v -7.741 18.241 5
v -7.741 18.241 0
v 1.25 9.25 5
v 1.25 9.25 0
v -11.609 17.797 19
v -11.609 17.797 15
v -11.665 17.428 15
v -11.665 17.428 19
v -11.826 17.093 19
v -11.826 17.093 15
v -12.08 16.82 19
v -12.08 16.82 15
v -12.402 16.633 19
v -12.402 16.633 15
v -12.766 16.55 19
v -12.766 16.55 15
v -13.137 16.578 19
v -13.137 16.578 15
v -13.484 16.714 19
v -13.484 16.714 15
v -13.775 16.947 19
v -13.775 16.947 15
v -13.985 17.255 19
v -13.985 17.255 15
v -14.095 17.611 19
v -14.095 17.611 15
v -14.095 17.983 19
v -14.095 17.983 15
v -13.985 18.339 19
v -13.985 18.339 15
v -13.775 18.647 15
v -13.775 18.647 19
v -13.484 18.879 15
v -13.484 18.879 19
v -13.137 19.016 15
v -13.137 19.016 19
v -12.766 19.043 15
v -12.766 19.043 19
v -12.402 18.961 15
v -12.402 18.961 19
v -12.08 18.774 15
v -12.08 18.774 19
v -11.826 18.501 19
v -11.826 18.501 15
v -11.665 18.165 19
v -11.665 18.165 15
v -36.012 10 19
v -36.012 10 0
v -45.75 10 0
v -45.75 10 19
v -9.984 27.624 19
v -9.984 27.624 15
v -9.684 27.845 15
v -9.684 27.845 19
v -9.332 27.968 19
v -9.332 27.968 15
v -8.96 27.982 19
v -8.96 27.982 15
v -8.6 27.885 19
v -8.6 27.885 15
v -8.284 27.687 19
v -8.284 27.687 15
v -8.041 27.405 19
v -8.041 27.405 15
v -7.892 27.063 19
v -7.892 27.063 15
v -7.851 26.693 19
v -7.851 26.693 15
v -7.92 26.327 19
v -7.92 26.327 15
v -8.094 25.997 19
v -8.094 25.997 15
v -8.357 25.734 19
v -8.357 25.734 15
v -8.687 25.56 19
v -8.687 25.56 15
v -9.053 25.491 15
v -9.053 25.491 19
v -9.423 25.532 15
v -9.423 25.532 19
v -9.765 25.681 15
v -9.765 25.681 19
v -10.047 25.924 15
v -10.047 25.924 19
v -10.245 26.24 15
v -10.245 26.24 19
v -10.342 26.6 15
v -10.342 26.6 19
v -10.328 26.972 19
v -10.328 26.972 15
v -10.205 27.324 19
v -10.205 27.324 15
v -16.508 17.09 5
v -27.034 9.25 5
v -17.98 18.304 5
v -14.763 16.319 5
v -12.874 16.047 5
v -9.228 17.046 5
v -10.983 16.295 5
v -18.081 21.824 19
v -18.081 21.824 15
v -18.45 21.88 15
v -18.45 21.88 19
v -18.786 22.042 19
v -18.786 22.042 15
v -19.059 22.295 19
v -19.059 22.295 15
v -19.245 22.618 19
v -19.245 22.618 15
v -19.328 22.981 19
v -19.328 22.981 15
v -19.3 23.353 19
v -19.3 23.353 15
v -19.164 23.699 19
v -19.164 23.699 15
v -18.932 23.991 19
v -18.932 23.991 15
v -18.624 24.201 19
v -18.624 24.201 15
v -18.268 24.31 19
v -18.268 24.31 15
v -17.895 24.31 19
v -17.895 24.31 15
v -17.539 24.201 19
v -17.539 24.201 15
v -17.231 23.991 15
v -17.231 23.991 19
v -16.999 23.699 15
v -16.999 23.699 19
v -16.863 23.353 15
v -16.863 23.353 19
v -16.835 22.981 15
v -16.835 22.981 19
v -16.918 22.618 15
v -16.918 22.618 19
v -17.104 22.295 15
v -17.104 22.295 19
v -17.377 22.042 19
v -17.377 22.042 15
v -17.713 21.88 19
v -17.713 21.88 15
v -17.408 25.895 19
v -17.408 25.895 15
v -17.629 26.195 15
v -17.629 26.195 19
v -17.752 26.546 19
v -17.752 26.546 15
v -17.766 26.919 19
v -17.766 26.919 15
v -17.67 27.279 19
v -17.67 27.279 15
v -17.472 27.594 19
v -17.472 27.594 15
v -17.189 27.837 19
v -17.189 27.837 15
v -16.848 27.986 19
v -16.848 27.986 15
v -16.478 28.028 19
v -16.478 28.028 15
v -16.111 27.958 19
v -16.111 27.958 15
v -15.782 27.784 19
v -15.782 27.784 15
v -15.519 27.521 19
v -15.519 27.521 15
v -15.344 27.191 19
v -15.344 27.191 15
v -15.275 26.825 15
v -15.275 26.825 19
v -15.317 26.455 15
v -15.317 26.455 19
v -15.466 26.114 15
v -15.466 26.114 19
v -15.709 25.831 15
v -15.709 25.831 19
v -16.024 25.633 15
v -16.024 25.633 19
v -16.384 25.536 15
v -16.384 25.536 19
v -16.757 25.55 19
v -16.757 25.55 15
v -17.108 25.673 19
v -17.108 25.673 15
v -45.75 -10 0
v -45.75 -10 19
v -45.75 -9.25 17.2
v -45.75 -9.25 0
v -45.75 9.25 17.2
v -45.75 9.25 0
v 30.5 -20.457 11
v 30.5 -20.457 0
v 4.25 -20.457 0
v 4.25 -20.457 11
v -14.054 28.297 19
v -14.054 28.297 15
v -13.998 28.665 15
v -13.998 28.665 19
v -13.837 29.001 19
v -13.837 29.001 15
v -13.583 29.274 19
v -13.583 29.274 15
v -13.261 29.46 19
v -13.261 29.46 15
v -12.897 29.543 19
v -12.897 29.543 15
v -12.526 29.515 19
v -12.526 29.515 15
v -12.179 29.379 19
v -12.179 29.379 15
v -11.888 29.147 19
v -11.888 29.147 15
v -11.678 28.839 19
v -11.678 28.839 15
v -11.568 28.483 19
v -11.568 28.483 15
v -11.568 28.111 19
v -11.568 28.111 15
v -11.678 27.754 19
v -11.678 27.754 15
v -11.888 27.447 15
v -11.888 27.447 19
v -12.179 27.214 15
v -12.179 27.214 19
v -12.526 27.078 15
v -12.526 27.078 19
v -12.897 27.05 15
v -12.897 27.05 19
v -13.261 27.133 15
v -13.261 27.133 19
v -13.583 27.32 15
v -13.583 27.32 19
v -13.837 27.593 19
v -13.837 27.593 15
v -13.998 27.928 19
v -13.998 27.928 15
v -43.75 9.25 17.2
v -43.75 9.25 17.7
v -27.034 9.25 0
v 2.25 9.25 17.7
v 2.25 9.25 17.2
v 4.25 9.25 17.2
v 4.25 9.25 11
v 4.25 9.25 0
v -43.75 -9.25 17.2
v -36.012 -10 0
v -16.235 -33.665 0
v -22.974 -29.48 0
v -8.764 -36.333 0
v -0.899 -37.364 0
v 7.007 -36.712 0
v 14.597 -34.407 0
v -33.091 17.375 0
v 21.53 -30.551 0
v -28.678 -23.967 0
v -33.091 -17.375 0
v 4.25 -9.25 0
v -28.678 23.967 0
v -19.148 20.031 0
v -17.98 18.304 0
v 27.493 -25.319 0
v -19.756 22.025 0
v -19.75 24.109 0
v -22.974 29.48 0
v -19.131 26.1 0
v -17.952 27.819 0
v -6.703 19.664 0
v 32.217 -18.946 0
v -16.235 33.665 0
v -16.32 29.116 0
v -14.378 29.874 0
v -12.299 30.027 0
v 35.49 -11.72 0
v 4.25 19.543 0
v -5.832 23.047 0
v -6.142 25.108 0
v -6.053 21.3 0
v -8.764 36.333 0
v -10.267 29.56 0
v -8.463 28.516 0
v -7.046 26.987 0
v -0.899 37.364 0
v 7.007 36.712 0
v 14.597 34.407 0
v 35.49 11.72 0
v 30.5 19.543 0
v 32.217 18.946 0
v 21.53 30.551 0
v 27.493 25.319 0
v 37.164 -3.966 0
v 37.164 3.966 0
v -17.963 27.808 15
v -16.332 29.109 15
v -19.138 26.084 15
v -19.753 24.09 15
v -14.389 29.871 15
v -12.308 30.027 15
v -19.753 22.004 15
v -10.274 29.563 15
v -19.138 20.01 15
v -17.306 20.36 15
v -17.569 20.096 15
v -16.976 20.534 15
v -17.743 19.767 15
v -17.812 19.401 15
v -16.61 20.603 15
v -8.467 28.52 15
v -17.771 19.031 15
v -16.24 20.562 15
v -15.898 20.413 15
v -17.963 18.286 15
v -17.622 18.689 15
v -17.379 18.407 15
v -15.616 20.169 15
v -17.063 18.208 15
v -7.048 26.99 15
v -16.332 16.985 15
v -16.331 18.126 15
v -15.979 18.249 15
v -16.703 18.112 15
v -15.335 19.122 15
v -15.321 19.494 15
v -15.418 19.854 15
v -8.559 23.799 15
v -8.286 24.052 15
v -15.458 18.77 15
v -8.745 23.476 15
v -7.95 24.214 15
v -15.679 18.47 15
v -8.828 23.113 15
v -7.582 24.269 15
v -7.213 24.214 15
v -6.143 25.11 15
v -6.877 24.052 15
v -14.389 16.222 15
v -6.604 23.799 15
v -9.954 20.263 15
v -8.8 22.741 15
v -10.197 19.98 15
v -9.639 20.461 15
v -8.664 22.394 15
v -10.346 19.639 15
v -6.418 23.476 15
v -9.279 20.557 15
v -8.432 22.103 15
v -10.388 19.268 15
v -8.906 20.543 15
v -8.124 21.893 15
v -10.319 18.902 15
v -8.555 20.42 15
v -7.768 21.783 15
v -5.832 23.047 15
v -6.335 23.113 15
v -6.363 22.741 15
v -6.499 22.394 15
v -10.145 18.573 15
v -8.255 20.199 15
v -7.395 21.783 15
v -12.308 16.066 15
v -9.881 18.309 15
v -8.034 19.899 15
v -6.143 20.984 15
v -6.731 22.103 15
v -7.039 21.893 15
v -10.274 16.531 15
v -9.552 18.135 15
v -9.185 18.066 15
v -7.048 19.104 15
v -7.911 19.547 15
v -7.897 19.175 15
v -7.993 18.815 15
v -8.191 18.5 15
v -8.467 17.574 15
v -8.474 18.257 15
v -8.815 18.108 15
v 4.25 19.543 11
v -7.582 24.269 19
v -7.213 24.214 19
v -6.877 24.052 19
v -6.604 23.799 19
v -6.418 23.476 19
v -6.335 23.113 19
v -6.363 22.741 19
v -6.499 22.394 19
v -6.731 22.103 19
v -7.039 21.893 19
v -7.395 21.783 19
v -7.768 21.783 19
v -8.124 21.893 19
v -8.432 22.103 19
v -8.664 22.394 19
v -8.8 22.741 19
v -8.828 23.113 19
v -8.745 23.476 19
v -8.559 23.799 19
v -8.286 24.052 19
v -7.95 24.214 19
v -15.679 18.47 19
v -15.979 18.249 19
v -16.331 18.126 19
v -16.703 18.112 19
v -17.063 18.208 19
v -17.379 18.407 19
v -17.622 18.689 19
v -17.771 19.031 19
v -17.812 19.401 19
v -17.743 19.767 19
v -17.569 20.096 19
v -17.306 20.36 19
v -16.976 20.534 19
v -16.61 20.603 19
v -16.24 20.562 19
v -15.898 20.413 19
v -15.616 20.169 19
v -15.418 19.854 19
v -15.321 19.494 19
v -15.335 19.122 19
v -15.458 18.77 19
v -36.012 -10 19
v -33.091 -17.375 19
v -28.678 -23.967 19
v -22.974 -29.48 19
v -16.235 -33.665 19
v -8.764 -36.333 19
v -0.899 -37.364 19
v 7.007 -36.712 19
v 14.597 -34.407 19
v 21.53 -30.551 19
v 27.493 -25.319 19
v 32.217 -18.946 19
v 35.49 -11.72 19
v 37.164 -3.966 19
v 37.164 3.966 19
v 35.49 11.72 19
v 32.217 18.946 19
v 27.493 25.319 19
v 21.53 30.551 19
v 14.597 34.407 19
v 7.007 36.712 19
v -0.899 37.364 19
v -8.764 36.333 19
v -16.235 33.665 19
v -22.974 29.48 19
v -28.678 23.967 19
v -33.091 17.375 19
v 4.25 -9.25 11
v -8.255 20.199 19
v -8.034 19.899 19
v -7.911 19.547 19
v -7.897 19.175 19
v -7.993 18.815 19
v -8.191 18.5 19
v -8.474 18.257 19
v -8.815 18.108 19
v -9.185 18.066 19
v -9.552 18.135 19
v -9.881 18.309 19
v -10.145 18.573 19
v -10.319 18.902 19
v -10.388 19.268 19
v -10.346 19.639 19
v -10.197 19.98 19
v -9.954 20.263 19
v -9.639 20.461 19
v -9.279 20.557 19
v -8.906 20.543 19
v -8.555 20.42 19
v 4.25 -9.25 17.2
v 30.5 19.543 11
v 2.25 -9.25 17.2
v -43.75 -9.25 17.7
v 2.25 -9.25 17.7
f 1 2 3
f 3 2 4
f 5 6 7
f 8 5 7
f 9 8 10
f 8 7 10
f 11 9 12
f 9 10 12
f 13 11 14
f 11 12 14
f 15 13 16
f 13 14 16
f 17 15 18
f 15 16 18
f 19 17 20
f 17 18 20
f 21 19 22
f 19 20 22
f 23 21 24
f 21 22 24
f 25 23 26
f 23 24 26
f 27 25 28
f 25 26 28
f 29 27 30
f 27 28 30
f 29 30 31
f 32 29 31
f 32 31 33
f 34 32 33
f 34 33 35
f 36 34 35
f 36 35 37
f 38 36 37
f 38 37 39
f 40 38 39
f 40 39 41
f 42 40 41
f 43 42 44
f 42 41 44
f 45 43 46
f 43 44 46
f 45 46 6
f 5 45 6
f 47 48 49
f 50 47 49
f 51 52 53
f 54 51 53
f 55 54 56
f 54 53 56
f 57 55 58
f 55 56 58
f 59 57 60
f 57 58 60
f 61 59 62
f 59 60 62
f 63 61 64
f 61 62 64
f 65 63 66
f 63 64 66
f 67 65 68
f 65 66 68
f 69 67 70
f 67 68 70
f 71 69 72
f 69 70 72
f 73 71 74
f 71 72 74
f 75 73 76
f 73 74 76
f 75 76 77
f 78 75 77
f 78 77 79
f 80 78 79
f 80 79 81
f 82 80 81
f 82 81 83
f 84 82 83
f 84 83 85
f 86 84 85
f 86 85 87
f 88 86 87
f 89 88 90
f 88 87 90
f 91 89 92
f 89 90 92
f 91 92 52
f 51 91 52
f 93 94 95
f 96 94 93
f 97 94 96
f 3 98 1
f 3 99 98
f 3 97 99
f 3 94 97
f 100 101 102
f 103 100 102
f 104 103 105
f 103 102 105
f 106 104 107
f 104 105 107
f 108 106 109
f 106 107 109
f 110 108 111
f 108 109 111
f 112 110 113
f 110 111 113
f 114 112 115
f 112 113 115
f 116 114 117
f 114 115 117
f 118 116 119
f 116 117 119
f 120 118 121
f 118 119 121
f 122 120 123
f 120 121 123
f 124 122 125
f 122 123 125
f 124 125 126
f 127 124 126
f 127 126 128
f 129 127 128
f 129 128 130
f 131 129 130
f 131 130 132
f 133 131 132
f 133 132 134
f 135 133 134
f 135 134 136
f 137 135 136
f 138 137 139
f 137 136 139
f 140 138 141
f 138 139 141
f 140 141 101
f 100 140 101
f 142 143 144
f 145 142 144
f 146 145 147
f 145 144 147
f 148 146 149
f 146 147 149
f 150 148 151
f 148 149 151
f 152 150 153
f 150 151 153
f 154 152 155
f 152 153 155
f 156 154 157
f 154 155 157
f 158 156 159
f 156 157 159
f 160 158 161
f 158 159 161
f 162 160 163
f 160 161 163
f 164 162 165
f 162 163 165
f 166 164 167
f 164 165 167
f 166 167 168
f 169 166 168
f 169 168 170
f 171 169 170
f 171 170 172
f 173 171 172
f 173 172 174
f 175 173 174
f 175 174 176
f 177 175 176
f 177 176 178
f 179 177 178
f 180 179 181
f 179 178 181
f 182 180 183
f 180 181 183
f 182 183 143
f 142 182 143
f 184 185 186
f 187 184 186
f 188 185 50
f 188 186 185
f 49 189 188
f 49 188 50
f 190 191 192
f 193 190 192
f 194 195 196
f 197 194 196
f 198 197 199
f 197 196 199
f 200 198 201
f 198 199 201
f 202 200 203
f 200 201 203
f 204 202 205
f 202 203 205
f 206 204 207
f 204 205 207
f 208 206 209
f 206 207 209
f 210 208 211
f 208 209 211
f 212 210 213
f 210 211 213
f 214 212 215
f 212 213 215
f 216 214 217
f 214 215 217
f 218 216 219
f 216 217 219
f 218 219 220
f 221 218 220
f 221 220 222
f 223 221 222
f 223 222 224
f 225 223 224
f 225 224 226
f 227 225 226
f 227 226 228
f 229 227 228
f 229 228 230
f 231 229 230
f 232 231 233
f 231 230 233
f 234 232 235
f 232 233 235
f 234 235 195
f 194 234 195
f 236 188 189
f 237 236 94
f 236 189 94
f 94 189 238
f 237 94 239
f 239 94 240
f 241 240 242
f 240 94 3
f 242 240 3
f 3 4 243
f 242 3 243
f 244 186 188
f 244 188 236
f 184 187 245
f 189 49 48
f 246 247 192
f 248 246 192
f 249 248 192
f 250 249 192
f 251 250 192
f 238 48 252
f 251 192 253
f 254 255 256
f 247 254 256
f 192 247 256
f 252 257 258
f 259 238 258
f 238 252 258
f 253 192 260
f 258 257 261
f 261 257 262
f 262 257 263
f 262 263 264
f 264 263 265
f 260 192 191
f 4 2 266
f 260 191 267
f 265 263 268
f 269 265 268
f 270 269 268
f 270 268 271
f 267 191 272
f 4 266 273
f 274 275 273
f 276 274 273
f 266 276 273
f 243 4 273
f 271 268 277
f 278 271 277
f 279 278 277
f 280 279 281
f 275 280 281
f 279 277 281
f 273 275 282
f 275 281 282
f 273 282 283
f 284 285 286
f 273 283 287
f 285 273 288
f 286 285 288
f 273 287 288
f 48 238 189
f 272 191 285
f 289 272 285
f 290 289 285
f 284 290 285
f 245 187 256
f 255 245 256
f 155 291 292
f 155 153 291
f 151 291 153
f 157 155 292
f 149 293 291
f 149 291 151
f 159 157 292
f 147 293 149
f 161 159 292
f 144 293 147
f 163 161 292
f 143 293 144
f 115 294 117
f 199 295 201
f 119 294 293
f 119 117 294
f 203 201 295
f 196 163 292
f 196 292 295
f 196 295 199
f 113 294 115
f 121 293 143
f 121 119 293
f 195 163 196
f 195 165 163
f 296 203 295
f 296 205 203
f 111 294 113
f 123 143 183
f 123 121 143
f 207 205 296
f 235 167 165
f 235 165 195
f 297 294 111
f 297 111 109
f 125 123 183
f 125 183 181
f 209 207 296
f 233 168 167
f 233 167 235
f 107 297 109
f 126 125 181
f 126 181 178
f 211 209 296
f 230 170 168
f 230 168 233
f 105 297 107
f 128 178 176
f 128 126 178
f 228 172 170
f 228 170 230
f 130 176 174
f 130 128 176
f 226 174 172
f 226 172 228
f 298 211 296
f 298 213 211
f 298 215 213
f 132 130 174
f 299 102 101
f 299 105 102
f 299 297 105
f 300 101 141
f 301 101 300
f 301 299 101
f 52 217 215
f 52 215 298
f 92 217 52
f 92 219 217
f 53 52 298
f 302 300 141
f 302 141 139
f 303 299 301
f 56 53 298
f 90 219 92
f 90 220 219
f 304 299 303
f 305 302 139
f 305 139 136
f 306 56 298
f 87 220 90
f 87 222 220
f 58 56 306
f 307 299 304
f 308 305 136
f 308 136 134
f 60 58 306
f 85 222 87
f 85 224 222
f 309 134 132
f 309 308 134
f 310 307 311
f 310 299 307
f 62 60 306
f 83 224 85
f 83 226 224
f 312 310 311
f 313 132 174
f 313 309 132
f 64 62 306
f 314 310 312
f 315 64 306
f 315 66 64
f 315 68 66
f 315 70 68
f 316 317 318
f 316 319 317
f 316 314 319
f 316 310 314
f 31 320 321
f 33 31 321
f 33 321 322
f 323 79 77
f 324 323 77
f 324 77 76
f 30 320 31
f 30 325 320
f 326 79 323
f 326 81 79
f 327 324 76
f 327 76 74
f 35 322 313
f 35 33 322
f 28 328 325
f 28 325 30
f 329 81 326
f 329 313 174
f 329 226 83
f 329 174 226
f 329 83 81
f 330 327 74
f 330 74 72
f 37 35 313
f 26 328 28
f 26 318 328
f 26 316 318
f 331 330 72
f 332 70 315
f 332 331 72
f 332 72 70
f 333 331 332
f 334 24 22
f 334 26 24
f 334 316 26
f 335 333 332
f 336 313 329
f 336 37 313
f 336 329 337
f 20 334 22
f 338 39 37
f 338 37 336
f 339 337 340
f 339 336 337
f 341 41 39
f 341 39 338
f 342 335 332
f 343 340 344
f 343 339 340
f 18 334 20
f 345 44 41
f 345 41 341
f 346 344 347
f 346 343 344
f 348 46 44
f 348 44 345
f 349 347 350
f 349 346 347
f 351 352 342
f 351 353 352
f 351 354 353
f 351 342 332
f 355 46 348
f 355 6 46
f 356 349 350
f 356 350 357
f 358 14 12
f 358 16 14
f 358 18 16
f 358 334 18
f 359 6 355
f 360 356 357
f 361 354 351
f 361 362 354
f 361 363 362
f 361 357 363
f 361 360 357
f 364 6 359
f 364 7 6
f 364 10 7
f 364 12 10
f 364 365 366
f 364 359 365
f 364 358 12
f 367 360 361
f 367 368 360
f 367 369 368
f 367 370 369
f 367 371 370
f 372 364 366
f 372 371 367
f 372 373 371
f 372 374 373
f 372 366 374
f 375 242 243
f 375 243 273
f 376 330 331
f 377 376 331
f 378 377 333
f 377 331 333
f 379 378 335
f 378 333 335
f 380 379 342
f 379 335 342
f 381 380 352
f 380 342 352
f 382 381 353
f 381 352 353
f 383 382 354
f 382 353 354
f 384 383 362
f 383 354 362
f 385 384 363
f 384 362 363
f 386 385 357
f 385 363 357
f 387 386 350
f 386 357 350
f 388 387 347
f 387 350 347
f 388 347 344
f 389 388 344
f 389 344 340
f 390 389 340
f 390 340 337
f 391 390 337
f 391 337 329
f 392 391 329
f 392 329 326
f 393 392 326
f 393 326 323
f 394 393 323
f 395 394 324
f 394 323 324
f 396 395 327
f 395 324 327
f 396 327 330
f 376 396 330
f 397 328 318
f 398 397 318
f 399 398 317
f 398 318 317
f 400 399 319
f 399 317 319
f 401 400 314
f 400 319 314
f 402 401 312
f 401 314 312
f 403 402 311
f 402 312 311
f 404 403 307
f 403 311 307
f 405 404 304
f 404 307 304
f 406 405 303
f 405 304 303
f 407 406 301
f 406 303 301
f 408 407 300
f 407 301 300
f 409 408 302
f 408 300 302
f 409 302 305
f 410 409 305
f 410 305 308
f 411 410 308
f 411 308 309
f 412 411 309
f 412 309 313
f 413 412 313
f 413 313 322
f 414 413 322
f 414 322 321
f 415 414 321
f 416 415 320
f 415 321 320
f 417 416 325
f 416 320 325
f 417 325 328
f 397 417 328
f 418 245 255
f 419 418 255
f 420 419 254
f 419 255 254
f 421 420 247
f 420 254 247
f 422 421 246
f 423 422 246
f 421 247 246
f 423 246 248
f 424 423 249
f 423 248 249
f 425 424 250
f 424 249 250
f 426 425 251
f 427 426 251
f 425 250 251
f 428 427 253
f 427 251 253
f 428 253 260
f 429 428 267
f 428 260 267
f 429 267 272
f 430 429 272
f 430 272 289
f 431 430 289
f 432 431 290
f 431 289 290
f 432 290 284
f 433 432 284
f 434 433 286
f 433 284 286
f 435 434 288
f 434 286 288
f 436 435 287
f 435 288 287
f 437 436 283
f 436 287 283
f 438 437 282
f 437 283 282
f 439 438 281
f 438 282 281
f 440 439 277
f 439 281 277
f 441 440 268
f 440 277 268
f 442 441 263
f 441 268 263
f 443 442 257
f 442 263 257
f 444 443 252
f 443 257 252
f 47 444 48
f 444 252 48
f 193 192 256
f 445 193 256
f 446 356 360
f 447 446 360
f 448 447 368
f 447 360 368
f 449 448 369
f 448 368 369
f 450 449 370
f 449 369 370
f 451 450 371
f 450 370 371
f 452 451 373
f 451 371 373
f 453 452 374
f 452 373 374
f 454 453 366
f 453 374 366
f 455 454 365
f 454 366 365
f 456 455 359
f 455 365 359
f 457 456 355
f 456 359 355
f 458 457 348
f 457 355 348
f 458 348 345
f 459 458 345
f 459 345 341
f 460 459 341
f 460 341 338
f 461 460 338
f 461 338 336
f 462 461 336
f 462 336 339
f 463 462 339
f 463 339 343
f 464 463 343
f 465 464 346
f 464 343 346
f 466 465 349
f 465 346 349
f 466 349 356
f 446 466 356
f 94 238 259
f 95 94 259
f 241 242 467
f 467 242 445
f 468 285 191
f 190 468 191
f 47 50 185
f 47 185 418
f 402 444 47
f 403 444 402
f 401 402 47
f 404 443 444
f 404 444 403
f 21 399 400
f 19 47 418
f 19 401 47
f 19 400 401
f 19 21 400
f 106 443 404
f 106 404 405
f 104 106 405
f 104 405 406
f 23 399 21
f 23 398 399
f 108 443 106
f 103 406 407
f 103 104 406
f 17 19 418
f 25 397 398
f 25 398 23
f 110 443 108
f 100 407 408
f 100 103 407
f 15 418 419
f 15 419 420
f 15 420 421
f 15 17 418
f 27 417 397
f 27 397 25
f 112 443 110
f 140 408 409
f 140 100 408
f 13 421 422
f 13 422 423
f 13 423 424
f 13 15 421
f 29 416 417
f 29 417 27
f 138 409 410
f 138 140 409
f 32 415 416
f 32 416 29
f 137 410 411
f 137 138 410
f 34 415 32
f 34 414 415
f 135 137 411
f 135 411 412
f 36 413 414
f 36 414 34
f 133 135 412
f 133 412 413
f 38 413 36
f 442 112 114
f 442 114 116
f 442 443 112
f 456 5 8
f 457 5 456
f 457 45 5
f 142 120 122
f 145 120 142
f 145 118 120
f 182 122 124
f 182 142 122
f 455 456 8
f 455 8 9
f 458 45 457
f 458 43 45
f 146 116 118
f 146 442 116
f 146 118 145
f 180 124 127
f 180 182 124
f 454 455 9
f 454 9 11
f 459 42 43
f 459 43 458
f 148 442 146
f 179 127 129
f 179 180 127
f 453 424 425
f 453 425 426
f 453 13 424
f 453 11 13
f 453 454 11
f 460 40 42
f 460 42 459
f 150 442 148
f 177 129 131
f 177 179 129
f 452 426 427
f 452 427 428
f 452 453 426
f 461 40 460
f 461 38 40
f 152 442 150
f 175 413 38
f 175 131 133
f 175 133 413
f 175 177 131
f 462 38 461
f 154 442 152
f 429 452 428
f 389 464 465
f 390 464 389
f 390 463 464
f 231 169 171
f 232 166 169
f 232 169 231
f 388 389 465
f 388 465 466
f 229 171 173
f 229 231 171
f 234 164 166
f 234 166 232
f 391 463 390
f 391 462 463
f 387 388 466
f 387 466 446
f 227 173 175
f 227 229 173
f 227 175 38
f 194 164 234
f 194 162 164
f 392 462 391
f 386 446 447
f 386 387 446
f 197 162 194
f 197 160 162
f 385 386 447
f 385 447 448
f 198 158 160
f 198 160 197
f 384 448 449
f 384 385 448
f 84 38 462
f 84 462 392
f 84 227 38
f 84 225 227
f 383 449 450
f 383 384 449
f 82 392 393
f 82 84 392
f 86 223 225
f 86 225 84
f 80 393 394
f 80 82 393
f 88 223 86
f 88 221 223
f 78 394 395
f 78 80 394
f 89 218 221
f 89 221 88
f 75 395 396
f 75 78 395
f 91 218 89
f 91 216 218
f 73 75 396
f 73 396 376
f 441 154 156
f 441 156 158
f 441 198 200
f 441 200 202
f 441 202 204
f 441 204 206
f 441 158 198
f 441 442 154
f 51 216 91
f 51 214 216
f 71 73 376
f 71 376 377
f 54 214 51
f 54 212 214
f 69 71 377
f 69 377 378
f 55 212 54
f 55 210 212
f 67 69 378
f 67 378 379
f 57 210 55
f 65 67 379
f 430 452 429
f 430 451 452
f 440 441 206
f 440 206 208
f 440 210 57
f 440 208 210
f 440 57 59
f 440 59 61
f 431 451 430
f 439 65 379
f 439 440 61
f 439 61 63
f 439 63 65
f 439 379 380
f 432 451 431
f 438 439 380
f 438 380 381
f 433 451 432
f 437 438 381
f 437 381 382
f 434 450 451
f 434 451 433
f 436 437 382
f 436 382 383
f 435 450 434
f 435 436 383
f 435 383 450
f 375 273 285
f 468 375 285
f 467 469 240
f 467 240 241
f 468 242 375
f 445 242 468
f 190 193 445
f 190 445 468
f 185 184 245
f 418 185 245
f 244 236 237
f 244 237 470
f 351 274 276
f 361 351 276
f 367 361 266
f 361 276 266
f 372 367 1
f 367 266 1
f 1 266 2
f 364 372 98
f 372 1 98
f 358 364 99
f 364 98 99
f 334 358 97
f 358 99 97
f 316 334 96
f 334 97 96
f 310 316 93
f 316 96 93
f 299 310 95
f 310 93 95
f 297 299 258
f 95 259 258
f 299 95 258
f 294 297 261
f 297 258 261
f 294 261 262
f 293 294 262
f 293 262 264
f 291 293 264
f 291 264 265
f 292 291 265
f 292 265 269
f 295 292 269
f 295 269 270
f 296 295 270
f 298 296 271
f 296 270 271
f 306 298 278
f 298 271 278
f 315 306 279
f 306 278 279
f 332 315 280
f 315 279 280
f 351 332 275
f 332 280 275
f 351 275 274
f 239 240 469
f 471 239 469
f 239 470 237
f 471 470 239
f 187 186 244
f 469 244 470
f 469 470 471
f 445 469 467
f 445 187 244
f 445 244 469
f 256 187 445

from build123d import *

# Parameters (mm, degrees)
F0_W             = 1
F0_H             = 20
F1_DEPTH         = 19
F2_W             = 50
F2_H             = 18.5
F3_DEPTH         = 17.2
F4_W             = 46
F4_H             = 18.5
F5_DEPTH         = 0.5
F7_DEPTH         = 11
F10_DEPTH        = 5
F8_R             = 7
F11_DEPTH        = 15
F12_R            = 1.25
F13_DEPTH        = 4
F13_COPIES_COUNT = 8


# Not quite as in the source:
# - a pattern or mirror of a feature is missing from the dataset's text; its kind, count and spacing are read off the source's solid


with BuildPart() as f1:
    # F0 (on Top) → F1 (new body)
    with BuildSketch(Plane.XY):
        with BuildLine():
            ThreePointArc((-36.0123676672, -10), (5.0462056754, -37.0327751226), (37.375, 0))
            ThreePointArc((37.375, 0), (5.0462056754, 37.0327751226), (-36.0123676672, 10))
            Line((-36.0123676672, 10), (-30, 10))
            Line((-30, 10), (-30, -10))
            Line((-30, -10), (-36.0123676672, -10))
        make_face()
        with BuildLine():
            Line((-30, 10), (-36.0123676672, 10))
            ThreePointArc((-36.0123676672, 10), (-37.375, 0), (-36.0123676672, -10))
            Line((-36.0123676672, -10), (-30, -10))
            Line((-30, -10), (-30, 10))
        make_face()
        with BuildLine():
            ThreePointArc((-36.0123676672, -10), (-37.375, 0), (-36.0123676672, 10))
            Line((-36.0123676672, 10), (-44.75, 10))
            Line((-44.75, 10), (-44.75, -10))
            Line((-44.75, -10), (-36.0123676672, -10))
        make_face()
        with Locations((-45.25, 0)):
            Rectangle(F0_W, F0_H)
    extrude(amount=F1_DEPTH)

    # F2 (on face) → F3 (cut)
    with BuildSketch(Plane(origin=(0, 0, 0), x_dir=(1, 0, 0), z_dir=(0, 0, -1))):
        with Locations((-20.75, 0)):
            Rectangle(F2_W, F2_H)
    extrude(amount=-F3_DEPTH, mode=Mode.SUBTRACT)

    # F4 (on face) → F5 (cut)
    with BuildSketch(Plane(origin=(0, 0, 17.2), x_dir=(1, 0, 0), z_dir=(0, 0, -1))):
        with Locations((-20.75, 0)):
            Rectangle(F4_W, F4_H)
    extrude(amount=-F5_DEPTH, mode=Mode.SUBTRACT)

    # F6 (on face) → F7 (cut)
    with BuildSketch(Plane(origin=(0, 0, 0), x_dir=(1, 0, 0), z_dir=(0, 0, -1))):
        Polygon((30.5, 20.4567786688), (4.25, 20.4567786688), (4.25, 9.25), (4.25, -9.25), (4.25, -19.5432213312), (30.5, -19.5432213312), align=None)
    extrude(amount=-F7_DEPTH, mode=Mode.SUBTRACT)

    # F9 (on face) → F10 (cut)
    with BuildSketch(Plane(origin=(0, 0, 0), x_dir=(1, 0, 0), z_dir=(0, 0, -1))):
        Polygon((-27.0342712475, -9.25), (-12.8921356237, -23.3921356237), (1.25, -9.25), align=None)
    extrude(amount=-F10_DEPTH, mode=Mode.SUBTRACT)

    # F8 (on face) → F11 (cut)
    with BuildSketch(Plane(origin=(0, 0, 0), x_dir=(1, 0, 0), z_dir=(0, 0, -1))):
        with Locations((-12.8315193579, -23.0468716472)):
            Circle(F8_R)
    extrude(amount=-F11_DEPTH, mode=Mode.SUBTRACT)

    # F12 (on face) → F13 (cut)
    with BuildSketch(Plane(origin=(0, 0, 15), x_dir=(1, 0, 0), z_dir=(0, 0, -1))):
        with Locations((-12.8591003243, -17.7969360865)):
            Circle(F12_R)
    f13 = extrude(amount=-F13_DEPTH, mode=Mode.SUBTRACT)

    # F13_copies: F13 ×8 about axis
    f13_copies_axis = Axis((-12.831519, 23.046872, 0), (0, 0, 1))
    for i in range(1, F13_COPIES_COUNT):
        add(f13.rotate(f13_copies_axis, i * 360 / F13_COPIES_COUNT), mode=Mode.SUBTRACT)


solid = f1.part
